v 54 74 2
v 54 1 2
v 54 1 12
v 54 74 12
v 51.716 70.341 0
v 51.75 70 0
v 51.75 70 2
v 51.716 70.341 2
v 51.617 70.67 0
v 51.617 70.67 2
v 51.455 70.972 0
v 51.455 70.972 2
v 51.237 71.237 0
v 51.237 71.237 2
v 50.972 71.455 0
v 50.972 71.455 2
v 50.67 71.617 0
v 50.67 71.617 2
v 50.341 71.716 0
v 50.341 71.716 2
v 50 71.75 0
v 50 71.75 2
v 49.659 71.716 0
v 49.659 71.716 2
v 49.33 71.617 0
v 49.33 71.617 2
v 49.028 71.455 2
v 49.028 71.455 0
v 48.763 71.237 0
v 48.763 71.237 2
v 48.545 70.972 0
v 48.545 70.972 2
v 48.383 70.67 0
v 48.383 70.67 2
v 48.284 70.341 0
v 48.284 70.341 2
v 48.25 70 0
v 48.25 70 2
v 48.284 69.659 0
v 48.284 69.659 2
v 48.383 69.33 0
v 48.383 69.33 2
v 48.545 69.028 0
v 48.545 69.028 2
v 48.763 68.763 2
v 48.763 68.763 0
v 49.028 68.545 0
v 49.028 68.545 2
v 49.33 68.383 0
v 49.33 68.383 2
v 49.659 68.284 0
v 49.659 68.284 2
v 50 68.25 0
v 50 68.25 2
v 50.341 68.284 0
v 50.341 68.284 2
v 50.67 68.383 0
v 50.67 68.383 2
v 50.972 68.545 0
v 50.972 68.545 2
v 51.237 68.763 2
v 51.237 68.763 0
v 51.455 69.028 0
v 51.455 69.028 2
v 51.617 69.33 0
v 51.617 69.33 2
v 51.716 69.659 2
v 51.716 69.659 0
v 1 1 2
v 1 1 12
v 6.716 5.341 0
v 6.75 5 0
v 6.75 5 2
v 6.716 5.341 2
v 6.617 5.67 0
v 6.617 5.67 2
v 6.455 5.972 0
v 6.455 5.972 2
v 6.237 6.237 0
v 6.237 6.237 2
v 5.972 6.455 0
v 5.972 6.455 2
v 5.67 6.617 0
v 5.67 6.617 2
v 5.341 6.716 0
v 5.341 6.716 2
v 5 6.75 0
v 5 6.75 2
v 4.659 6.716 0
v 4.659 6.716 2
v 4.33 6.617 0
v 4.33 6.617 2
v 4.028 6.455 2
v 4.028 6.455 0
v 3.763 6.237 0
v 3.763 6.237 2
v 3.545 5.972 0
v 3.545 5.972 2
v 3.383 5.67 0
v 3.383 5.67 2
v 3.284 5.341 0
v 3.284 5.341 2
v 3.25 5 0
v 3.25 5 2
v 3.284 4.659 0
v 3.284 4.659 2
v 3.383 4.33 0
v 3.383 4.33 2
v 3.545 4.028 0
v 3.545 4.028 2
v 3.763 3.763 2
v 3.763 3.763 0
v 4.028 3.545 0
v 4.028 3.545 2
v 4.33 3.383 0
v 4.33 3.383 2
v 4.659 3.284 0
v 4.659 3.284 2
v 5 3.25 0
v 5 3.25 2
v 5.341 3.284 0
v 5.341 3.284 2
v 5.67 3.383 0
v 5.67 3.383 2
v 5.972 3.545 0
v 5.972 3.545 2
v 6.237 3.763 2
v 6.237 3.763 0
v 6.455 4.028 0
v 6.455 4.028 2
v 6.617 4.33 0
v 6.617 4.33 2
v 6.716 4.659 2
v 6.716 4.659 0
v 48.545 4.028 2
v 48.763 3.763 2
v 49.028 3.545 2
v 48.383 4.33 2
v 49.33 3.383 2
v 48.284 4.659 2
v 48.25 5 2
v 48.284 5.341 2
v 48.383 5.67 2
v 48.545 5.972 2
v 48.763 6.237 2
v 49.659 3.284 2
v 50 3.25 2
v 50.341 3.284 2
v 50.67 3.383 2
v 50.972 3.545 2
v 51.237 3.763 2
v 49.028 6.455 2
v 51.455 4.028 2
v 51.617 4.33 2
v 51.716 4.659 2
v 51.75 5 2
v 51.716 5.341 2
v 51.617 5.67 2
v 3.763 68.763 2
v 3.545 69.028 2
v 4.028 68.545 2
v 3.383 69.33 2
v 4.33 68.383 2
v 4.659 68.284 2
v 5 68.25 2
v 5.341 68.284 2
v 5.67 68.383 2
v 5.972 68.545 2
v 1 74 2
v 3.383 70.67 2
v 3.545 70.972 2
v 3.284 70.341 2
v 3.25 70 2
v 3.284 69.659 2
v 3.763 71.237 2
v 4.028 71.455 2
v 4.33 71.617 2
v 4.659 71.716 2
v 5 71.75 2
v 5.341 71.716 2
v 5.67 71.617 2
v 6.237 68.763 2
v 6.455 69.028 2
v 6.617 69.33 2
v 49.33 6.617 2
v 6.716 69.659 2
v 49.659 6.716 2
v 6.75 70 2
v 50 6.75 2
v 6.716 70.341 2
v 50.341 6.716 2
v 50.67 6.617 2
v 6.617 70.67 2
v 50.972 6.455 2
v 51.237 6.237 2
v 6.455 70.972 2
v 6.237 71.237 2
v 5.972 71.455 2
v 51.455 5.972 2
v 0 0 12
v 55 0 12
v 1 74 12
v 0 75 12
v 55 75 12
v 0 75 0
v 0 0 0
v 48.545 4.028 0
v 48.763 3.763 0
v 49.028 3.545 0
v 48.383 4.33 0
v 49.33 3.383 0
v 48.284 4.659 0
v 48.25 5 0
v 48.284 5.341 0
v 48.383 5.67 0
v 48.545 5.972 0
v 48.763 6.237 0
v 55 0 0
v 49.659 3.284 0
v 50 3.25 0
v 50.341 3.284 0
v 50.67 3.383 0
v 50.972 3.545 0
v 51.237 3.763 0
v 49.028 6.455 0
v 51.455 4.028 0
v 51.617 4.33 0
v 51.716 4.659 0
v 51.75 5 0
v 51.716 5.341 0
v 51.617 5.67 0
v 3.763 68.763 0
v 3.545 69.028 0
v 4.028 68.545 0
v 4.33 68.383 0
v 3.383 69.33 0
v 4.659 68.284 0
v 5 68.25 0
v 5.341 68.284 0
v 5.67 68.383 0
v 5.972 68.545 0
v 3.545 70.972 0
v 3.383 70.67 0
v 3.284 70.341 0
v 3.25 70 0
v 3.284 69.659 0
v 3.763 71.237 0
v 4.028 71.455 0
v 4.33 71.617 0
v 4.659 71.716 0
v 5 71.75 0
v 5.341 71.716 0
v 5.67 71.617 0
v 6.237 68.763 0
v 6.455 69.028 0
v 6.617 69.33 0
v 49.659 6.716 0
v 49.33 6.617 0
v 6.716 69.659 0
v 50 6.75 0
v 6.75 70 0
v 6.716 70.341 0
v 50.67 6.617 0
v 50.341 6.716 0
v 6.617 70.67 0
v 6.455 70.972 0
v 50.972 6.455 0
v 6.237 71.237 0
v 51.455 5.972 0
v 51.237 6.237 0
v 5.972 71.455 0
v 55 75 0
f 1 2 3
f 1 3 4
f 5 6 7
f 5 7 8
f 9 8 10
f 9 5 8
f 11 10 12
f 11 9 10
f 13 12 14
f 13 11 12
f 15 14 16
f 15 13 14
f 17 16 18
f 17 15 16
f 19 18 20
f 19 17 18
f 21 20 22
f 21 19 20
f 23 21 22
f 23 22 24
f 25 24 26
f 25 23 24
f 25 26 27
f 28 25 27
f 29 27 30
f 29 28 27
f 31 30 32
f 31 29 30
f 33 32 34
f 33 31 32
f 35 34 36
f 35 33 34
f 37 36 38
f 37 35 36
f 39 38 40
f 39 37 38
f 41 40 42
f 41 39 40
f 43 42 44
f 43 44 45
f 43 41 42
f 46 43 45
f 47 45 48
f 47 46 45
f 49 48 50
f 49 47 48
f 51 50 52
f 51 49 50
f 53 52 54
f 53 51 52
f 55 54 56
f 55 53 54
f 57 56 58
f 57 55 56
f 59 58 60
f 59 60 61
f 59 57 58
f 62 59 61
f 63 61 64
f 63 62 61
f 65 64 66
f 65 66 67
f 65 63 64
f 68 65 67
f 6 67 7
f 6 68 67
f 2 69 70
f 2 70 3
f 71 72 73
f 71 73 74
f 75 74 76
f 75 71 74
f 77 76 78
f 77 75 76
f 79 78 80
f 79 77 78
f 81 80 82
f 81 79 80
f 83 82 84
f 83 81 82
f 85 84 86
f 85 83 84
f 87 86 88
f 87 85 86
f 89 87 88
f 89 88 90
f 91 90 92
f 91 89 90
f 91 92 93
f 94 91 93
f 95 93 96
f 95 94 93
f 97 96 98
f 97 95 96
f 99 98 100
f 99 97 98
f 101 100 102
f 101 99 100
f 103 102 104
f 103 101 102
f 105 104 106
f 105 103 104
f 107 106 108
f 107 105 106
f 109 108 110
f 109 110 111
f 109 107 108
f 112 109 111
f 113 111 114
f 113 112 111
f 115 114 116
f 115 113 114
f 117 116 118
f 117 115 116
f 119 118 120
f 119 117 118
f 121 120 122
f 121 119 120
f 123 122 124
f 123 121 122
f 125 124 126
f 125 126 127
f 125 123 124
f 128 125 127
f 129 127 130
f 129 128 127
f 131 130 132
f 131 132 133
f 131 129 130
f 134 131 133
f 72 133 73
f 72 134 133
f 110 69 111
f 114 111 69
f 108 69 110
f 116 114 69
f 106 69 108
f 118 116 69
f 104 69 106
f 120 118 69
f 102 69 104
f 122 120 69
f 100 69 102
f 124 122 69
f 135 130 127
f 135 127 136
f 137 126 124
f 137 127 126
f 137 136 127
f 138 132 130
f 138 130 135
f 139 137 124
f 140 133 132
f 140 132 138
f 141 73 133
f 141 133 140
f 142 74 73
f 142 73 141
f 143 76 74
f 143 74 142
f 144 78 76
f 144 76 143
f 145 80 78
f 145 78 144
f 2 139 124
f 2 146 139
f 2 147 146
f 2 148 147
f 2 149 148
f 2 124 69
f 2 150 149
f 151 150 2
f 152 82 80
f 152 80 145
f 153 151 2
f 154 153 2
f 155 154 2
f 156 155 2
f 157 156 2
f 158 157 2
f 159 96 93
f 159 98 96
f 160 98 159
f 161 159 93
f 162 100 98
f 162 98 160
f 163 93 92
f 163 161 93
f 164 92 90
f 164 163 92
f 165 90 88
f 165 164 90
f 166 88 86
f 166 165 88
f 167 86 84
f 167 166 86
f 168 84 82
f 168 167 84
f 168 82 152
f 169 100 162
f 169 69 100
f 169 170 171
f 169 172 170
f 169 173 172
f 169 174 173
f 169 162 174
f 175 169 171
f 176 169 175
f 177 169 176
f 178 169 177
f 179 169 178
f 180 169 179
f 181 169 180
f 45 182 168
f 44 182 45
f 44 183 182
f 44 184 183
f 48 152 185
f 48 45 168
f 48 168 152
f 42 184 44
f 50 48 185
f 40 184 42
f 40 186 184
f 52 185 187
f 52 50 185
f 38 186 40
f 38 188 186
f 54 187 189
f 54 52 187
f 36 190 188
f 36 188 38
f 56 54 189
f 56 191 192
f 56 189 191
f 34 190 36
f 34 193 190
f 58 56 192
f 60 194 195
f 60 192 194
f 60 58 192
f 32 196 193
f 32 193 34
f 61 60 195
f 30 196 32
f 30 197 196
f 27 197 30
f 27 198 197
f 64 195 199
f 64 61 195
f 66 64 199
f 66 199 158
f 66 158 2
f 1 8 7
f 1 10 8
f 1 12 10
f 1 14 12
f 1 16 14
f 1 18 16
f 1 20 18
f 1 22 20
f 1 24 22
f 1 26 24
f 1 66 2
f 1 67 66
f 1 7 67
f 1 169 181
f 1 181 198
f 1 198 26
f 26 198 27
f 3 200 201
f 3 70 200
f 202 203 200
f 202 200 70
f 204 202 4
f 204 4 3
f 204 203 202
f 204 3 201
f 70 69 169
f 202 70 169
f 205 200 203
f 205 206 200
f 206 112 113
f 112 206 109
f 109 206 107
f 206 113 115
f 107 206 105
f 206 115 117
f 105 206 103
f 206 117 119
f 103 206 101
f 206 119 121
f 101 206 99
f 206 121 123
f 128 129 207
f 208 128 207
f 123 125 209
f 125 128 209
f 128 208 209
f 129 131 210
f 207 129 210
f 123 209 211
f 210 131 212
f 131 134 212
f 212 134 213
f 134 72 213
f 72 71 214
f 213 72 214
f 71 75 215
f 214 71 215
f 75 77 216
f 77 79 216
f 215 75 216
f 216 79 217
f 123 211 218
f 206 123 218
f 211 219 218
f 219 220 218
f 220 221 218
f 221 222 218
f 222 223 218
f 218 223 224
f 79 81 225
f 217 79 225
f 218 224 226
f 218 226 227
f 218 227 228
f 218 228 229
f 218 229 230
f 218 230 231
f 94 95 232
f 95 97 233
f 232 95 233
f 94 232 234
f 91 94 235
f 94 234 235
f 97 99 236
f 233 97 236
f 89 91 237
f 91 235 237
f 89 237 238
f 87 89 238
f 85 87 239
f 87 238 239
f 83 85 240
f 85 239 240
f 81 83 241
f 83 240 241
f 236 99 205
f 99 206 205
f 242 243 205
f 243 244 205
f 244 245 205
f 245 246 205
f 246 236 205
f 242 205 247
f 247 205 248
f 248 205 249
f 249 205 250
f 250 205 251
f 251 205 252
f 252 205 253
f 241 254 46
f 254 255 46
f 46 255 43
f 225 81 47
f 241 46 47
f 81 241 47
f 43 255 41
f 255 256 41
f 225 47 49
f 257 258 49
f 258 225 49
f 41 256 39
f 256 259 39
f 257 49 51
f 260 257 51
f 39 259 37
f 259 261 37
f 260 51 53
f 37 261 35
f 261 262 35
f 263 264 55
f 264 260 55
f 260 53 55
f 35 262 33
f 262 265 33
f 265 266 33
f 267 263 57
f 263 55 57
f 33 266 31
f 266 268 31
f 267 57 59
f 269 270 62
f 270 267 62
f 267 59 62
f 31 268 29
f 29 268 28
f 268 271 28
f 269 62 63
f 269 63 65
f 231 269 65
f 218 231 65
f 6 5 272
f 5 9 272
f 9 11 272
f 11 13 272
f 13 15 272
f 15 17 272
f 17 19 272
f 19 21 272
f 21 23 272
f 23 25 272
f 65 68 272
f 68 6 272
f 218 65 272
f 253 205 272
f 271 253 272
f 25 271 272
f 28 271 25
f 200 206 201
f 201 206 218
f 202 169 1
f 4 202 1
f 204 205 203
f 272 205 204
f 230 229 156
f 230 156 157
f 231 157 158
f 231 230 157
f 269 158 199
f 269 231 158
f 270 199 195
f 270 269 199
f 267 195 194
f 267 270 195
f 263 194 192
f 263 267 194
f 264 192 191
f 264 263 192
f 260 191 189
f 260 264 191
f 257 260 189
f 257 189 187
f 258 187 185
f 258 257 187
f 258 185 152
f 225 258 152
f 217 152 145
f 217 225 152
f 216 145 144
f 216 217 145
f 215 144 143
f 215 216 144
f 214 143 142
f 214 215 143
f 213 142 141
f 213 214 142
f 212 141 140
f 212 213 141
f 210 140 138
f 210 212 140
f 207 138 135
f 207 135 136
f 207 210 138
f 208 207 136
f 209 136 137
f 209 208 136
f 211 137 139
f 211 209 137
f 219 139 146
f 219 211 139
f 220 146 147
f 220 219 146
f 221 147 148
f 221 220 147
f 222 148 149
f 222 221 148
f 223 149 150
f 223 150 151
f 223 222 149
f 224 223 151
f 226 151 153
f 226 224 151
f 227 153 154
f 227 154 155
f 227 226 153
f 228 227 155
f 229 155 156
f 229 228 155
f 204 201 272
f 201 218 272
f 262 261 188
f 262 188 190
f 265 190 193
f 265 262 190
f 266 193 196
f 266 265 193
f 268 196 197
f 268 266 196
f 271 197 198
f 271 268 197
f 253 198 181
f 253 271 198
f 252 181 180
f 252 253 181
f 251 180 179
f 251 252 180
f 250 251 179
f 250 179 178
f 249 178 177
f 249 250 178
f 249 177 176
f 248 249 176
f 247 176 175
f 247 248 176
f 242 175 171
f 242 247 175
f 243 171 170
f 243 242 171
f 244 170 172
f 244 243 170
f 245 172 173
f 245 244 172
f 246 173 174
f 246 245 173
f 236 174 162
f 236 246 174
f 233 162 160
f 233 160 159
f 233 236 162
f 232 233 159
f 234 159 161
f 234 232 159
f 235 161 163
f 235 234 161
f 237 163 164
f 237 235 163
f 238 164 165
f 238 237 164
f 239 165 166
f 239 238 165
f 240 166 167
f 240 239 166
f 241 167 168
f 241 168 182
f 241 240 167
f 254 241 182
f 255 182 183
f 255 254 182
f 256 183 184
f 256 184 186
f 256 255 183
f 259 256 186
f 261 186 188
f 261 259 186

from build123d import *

# Parameters (mm, degrees)
SKETCH_1_W      = 55
SKETCH_1_H      = 75
SKETCH_1_R      = 1.75
EXTRUDE_1_DEPTH = 2
SKETCH_2_W      = 55
SKETCH_2_H      = 75
SKETCH_2_W_2    = 53
SKETCH_2_H_2    = 73
EXTRUDE_2_DEPTH = 10


with BuildPart() as part:
    # Эскиз1 → Бобышка-Вытянуть1 (new body)
    with BuildSketch(Plane.XY):
        with Locations((27.5, 37.5)):
            Rectangle(SKETCH_1_W, SKETCH_1_H)
        with Locations((5, 70)):
            Circle(SKETCH_1_R, mode=Mode.SUBTRACT)
        with Locations((50, 70)):
            Circle(SKETCH_1_R, mode=Mode.SUBTRACT)
        with Locations((5, 5)):
            Circle(SKETCH_1_R, mode=Mode.SUBTRACT)
        with Locations((50, 5)):
            Circle(SKETCH_1_R, mode=Mode.SUBTRACT)
    extrude(amount=EXTRUDE_1_DEPTH)

    # Эскиз2 → Бобышка-Вытянуть2 (add)
    with BuildSketch(Plane.XY.offset(2)):
        with Locations((27.5, 37.5)):
            Rectangle(SKETCH_2_W, SKETCH_2_H)
        with Locations((27.5, 37.5)):
            Rectangle(SKETCH_2_W_2, SKETCH_2_H_2, mode=Mode.SUBTRACT)
    extrude(amount=EXTRUDE_2_DEPTH)


solid = part.part
